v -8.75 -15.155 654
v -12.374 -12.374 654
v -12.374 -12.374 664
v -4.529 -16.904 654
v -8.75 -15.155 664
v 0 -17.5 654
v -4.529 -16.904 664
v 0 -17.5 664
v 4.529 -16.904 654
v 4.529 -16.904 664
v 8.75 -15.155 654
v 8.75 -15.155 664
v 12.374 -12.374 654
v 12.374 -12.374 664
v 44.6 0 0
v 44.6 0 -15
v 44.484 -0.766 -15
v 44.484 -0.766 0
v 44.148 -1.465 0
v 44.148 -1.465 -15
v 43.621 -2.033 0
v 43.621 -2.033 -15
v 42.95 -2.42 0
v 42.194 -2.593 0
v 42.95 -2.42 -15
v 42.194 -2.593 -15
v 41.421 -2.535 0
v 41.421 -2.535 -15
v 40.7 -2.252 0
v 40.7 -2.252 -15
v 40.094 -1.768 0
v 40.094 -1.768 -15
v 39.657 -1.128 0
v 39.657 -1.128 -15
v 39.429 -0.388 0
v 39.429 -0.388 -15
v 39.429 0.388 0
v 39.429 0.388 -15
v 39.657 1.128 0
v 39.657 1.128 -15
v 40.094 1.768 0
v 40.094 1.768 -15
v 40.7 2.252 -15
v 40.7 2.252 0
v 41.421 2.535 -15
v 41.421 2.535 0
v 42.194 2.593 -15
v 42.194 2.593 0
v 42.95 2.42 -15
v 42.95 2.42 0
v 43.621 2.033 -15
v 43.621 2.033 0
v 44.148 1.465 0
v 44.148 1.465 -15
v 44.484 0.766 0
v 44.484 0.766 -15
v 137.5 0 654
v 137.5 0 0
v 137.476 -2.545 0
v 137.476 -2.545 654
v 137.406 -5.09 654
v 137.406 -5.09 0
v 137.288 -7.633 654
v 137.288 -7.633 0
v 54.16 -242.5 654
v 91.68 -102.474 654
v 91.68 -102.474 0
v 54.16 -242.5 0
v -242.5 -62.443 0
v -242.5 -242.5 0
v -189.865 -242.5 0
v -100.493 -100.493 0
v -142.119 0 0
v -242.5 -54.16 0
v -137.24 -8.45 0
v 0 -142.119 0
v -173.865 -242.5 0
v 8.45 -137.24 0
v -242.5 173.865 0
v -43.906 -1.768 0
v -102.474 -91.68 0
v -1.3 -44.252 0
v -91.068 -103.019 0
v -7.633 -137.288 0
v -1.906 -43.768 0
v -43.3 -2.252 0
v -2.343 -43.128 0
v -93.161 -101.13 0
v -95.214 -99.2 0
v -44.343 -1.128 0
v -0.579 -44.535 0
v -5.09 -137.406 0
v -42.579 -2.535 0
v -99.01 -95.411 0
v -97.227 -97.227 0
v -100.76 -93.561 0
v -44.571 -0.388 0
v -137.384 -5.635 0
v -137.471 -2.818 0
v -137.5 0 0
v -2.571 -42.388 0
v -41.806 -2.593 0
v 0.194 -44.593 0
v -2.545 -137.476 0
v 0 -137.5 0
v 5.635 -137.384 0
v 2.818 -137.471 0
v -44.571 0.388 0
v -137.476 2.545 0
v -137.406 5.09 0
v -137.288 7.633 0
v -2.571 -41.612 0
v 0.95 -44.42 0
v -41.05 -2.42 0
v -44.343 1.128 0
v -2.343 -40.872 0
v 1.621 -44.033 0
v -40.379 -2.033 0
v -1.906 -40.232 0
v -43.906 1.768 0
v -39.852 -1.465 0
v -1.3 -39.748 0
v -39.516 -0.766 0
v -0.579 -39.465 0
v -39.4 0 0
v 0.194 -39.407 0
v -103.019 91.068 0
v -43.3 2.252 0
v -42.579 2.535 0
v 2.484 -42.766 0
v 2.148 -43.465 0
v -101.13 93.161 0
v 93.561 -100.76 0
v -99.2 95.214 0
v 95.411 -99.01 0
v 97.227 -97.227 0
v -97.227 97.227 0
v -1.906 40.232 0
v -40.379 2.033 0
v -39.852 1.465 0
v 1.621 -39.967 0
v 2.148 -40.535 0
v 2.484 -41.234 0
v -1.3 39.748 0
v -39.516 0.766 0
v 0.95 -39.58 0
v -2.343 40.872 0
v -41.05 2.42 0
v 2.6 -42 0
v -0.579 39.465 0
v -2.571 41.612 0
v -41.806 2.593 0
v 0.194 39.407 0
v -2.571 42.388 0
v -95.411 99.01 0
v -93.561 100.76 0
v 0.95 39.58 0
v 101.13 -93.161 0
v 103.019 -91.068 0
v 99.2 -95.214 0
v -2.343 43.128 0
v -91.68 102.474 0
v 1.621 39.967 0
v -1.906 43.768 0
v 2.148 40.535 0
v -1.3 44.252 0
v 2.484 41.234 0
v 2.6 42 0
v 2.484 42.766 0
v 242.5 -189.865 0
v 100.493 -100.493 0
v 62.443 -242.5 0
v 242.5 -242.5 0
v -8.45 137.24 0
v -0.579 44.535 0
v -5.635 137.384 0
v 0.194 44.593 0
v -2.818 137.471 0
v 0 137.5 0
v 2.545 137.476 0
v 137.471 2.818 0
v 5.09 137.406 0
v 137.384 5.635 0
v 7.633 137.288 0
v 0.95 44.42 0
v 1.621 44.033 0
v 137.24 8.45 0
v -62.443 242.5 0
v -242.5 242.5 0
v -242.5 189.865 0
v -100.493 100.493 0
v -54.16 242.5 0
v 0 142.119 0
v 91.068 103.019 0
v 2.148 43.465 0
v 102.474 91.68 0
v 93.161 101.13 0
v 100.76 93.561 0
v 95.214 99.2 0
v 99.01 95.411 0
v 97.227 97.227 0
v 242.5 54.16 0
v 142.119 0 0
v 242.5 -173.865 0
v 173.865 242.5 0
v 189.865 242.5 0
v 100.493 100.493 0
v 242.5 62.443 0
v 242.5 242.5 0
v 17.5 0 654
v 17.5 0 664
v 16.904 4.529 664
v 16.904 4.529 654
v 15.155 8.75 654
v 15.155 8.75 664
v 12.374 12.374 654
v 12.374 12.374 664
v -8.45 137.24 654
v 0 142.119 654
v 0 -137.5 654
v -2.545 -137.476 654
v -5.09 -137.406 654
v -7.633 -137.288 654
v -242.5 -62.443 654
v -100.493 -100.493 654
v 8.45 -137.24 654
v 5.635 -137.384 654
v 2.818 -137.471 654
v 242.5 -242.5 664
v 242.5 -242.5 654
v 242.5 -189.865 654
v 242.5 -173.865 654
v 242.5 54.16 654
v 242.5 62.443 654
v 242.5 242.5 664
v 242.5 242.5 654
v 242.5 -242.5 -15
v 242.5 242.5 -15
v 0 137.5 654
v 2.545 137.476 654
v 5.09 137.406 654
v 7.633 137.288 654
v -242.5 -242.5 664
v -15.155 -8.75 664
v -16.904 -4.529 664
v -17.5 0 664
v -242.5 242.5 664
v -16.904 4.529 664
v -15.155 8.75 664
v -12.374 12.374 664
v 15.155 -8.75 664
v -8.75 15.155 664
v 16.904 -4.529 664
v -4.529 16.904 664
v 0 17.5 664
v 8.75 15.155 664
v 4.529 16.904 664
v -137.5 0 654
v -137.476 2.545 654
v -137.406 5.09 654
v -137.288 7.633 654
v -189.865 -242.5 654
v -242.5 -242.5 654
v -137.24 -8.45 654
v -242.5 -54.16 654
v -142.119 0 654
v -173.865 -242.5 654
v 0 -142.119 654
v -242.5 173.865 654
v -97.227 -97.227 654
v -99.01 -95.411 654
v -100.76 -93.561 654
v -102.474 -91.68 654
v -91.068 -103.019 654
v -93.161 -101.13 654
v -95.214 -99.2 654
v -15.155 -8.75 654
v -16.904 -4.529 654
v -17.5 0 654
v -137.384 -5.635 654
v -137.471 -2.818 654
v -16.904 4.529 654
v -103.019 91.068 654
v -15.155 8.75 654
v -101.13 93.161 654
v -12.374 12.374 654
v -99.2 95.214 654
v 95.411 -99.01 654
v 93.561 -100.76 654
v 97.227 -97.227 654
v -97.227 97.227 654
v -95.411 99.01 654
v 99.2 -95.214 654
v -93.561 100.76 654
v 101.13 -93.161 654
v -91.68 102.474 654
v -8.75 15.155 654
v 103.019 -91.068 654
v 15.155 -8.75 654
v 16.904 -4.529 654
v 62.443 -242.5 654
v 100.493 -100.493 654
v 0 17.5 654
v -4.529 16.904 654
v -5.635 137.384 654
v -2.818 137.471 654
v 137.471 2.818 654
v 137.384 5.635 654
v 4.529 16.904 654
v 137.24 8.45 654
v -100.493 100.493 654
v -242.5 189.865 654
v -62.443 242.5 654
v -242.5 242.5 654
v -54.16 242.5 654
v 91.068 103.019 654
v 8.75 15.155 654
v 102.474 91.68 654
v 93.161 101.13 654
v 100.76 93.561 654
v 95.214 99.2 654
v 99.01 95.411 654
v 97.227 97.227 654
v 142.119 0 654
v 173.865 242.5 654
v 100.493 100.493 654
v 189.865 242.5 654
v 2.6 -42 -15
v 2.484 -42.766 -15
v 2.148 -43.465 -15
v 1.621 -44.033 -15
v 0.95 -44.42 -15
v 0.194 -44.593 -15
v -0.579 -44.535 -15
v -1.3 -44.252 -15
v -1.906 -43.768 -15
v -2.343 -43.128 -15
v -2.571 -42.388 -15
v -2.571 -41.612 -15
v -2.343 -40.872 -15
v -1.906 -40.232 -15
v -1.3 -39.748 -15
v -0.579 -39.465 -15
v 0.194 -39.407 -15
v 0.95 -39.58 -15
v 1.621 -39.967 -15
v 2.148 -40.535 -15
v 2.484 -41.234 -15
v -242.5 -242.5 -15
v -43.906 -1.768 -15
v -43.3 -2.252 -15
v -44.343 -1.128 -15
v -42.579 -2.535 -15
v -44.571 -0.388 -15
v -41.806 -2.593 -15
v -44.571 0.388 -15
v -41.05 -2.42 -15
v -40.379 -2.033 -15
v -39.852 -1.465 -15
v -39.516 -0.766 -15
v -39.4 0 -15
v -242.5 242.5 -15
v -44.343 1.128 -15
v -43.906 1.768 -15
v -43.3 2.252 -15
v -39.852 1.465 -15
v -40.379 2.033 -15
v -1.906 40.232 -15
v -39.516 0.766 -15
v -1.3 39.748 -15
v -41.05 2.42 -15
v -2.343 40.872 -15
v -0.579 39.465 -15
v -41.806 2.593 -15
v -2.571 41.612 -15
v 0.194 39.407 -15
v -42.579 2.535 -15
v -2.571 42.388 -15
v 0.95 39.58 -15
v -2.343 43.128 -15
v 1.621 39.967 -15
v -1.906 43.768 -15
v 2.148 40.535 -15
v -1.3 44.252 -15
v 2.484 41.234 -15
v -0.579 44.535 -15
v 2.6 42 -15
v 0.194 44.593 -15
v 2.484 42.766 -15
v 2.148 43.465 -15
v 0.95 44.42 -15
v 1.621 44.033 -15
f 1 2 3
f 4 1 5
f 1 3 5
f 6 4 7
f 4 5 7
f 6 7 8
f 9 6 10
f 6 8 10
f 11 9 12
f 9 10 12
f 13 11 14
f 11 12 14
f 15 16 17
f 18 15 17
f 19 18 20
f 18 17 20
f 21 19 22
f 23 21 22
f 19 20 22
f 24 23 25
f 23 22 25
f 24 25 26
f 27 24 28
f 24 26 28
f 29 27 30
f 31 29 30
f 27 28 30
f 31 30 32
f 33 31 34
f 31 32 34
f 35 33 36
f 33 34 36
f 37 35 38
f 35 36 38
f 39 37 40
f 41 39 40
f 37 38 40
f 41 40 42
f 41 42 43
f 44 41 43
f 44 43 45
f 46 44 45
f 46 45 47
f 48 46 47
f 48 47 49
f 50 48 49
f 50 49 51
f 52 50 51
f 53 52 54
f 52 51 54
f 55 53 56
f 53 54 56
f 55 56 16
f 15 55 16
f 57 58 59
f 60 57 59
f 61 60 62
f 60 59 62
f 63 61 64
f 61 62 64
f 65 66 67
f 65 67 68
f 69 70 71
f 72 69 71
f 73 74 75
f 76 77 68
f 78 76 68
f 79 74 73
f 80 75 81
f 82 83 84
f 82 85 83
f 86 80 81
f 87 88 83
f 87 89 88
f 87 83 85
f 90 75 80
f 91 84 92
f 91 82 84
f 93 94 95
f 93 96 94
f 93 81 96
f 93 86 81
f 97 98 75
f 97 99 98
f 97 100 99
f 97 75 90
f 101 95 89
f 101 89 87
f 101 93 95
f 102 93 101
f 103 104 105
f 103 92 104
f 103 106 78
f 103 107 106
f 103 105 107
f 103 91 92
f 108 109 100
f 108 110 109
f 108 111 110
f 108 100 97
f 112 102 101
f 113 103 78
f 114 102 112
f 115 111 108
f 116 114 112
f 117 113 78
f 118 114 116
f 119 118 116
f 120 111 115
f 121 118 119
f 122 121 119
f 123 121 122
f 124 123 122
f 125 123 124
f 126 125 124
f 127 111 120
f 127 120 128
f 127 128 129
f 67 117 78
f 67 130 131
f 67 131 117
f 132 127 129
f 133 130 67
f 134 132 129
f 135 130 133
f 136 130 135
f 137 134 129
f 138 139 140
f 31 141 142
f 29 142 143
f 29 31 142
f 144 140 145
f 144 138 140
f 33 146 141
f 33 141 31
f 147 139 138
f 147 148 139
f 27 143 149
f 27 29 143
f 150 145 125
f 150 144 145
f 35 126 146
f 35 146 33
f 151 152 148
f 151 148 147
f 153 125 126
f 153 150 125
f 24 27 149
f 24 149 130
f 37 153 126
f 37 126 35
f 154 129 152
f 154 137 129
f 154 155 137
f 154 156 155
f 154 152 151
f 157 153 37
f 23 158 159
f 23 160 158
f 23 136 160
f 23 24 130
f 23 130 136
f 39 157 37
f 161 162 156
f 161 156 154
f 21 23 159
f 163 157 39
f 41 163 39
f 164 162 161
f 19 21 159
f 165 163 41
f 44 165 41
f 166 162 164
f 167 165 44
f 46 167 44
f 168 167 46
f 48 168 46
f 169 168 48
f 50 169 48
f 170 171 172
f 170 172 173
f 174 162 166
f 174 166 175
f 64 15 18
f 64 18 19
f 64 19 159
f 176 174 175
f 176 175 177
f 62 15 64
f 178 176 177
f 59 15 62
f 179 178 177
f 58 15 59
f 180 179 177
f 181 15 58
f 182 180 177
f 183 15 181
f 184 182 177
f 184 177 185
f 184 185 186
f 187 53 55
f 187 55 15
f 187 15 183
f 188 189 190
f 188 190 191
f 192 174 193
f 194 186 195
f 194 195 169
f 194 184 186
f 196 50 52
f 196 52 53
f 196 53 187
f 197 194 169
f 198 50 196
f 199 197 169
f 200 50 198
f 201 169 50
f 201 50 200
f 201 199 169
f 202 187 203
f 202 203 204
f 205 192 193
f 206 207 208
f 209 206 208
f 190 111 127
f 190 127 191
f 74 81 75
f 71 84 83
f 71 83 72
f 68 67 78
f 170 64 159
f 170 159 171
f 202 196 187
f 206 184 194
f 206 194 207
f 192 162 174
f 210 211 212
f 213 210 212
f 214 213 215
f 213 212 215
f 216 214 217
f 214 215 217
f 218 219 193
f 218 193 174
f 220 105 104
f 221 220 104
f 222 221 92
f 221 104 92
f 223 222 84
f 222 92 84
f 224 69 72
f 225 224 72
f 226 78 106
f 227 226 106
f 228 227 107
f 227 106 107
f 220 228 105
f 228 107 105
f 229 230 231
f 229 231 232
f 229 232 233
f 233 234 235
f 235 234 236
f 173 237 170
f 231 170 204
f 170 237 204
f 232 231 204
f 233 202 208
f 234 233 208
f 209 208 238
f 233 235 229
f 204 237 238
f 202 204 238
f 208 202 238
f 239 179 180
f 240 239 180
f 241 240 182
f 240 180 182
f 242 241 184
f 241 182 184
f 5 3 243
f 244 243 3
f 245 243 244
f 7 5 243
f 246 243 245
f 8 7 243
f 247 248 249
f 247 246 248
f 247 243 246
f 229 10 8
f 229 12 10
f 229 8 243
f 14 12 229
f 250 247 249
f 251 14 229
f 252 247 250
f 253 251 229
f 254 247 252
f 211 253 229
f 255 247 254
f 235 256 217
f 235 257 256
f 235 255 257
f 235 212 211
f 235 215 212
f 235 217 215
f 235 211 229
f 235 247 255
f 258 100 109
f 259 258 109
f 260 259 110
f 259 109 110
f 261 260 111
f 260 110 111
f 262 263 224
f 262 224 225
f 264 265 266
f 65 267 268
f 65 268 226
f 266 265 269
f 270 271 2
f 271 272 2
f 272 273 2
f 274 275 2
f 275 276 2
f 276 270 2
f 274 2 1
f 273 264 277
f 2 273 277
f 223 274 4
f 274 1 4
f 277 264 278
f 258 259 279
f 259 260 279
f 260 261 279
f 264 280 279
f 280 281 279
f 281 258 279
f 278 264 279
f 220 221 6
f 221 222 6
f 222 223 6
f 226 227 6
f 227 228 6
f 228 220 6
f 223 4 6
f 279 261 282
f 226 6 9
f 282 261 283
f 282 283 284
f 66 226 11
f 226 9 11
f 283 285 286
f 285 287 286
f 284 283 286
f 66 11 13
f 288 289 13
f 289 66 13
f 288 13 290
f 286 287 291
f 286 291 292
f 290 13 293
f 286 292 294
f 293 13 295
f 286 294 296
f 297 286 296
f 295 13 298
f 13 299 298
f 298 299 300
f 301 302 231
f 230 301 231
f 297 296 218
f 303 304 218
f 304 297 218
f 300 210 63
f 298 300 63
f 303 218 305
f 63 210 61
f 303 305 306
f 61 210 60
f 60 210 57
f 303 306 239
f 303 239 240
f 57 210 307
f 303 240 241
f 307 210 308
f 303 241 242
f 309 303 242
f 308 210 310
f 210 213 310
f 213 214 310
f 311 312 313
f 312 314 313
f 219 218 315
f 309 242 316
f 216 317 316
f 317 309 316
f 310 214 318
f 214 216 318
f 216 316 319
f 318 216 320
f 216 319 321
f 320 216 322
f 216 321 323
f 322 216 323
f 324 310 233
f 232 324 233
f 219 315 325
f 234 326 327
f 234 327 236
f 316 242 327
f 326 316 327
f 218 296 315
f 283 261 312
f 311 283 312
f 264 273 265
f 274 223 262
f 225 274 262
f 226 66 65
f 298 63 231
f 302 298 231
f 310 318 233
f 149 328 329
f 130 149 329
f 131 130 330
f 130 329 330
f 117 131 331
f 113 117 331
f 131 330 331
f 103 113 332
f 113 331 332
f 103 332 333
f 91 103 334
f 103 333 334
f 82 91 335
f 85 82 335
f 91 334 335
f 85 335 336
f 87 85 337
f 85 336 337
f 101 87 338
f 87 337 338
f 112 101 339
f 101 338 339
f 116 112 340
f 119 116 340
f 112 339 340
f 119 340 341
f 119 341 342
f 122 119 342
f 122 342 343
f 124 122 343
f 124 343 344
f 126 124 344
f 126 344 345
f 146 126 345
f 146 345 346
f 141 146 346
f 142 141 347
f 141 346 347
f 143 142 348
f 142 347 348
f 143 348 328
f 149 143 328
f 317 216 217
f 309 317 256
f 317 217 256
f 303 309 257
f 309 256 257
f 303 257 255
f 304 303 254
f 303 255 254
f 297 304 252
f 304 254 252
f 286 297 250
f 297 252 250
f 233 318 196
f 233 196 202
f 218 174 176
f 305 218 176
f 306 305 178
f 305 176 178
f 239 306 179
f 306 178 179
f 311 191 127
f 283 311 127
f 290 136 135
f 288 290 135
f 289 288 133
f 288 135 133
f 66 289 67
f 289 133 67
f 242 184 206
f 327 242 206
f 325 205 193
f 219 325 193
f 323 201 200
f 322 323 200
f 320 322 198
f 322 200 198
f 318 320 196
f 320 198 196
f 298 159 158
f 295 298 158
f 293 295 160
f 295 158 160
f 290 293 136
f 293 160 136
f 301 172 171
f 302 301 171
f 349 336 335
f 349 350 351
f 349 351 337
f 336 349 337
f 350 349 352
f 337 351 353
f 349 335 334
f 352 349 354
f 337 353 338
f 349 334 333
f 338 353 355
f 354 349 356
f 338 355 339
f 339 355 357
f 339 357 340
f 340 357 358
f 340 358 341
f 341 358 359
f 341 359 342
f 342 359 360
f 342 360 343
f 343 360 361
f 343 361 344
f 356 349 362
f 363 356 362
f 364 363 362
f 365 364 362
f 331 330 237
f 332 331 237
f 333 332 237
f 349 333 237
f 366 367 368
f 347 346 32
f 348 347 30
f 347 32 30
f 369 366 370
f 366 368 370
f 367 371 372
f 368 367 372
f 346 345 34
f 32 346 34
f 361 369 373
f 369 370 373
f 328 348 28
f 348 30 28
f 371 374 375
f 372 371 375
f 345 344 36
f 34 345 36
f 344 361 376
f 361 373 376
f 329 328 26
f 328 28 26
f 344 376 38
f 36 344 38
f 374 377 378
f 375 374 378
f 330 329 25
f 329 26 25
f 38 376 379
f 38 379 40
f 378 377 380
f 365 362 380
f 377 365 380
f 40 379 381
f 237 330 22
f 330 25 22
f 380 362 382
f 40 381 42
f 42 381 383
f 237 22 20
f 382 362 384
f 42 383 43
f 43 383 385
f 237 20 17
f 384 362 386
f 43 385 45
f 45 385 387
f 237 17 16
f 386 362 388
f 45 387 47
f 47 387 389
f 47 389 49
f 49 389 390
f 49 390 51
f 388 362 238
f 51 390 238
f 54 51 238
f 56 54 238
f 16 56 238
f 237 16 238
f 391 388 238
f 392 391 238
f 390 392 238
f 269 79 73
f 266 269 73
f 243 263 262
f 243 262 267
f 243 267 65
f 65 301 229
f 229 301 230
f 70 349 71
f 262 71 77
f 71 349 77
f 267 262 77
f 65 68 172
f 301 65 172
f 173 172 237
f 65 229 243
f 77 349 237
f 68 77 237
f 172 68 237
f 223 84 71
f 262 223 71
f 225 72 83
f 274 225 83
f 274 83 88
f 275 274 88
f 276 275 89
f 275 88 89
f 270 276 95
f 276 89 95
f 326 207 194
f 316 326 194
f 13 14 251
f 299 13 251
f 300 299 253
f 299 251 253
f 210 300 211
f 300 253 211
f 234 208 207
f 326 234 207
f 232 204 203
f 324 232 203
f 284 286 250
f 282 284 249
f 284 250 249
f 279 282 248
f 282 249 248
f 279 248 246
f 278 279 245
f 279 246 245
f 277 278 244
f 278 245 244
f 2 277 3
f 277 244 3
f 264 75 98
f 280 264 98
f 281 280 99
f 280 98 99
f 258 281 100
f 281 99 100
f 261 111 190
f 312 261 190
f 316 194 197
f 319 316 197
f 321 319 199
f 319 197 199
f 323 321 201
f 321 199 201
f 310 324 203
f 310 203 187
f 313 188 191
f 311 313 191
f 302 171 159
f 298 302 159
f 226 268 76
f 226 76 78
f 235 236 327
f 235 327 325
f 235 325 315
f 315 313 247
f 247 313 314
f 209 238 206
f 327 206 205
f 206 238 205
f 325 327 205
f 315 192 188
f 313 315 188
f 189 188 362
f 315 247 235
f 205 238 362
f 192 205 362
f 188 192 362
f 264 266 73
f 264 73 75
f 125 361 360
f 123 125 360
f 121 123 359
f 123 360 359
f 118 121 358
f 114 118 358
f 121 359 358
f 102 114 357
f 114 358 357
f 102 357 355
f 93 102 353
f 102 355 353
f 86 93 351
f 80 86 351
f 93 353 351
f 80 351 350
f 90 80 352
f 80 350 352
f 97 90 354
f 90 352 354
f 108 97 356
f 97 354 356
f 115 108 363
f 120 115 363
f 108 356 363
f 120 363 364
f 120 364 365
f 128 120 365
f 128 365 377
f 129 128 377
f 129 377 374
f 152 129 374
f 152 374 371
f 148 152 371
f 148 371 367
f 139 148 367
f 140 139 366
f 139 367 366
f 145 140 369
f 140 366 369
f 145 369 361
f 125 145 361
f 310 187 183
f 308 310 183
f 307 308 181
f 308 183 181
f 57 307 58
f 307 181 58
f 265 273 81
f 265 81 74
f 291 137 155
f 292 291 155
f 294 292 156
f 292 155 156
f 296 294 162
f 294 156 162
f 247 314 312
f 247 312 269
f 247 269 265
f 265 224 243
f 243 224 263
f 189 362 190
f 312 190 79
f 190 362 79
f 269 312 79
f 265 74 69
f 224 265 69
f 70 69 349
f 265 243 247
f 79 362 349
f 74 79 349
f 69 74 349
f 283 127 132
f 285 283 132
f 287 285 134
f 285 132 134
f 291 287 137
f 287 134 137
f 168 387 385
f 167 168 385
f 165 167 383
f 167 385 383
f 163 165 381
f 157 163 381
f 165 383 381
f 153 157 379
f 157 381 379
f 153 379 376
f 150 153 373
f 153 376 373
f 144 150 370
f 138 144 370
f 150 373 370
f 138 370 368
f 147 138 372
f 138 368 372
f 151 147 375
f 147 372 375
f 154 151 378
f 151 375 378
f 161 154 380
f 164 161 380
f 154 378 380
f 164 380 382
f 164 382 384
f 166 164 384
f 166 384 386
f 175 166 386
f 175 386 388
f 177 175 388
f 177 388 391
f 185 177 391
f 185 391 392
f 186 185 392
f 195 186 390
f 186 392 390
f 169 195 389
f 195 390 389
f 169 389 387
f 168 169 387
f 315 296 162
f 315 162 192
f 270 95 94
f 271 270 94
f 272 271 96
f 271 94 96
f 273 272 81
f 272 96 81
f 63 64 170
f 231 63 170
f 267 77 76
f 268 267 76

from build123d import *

# Parameters (mm, degrees)
F1_DEPTH = 15
F2_DEPTH = 654
F4_DEPTH = 10
F6_DEPTH = 10
F7_R     = 2.6
F8_DEPTH = 15


with BuildPart() as f1:
    # F0 (on Top) → F1 (new body)
    with BuildSketch(Plane.XY):
        Polygon((-242.5, 242.5), (-100.4931687369, 100.4931687369), (-62.4425529802, 242.5), align=None)
        with BuildLine():
            Line((-242.5, 189.8653347947), (-137.2879845203, 7.6327784171))
            ThreePointArc((-137.2879845203, 7.6327784171), (-127.1895403437, 52.2405094458), (-103.0185713345, 91.0682379329))
            Line((-103.0185713345, 91.0682379329), (-100.4931687369, 100.4931687369))
            Line((-100.4931687369, 100.4931687369), (-242.5, 242.5))
            Line((-242.5, 242.5), (-242.5, 189.8653347947))
        make_face()
        with BuildLine():
            ThreePointArc((95.4594154602, 95.4594154602), (124.723736889, 51.6622633693), (135, 0))
            Line((135, 0), (137.5, 0))
            ThreePointArc((137.5, 0), (137.4350093838, 4.2270788599), (137.2400989718, 8.4501617857))
            ThreePointArc((137.2400989718, 8.4501617857), (126.8762049548, 52.9969679913), (102.4744542077, 91.6800754517))
            ThreePointArc((102.4744542077, 91.6800754517), (99.8893313431, 94.4900602382), (97.2271824132, 97.2271824132))
            Line((97.2271824132, 97.2271824132), (95.4594154602, 95.4594154602))
        make_face()
        with BuildLine():
            Line((0, -135), (0, 0))
            Line((0, 0), (-95.4594154602, -95.4594154602))
            ThreePointArc((-95.4594154602, -95.4594154602), (-51.6622633693, -124.723736889), (0, -135))
        make_face()
        with BuildLine():
            Line((54.1603435369, -242.5), (91.6800754517, -102.4744542077))
            ThreePointArc((91.6800754517, -102.4744542077), (52.9969679913, -126.8762049548), (8.4501617857, -137.2400989718))
            Line((8.4501617857, -137.2400989718), (0, -142.1188021535))
            Line((0, -142.1188021535), (0, -242.5))
            Line((0, -242.5), (54.1603435369, -242.5))
        make_face()
        Polygon((242.5, -242.5), (100.4931687369, -100.4931687369), (62.4425529802, -242.5), align=None)
        Polygon((0, -242.5), (0, -142.1188021535), (-173.8653347947, -242.5), align=None)
        with BuildLine():
            ThreePointArc((0, -135), (51.6622633693, -124.723736889), (95.4594154602, -95.4594154602))
            Line((95.4594154602, -95.4594154602), (0, 0))
            Line((0, 0), (0, -135))
        make_face()
        with BuildLine():
            ThreePointArc((95.4594154602, -95.4594154602), (124.723736889, -51.6622633693), (135, 0))
            Line((135, 0), (0, 0))
            Line((0, 0), (95.4594154602, -95.4594154602))
        make_face()
        with BuildLine():
            Line((97.2271824132, -97.2271824132), (95.4594154602, -95.4594154602))
            ThreePointArc((95.4594154602, -95.4594154602), (51.6622633693, -124.723736889), (0, -135))
            Line((0, -135), (0, -137.5))
            ThreePointArc((0, -137.5), (4.2270788599, -137.4350093838), (8.4501617857, -137.2400989718))
            ThreePointArc((8.4501617857, -137.2400989718), (52.9969679913, -126.8762049548), (91.6800754517, -102.4744542077))
            ThreePointArc((91.6800754517, -102.4744542077), (94.4900602382, -99.8893313431), (97.2271824132, -97.2271824132))
        make_face()
        with BuildLine():
            ThreePointArc((-95.4594154602, 95.4594154602), (-51.6622633693, 124.723736889), (0, 135))
            Line((0, 135), (0, 137.5))
            ThreePointArc((0, 137.5), (-4.2270788599, 137.4350093838), (-8.4501617857, 137.2400989718))
            ThreePointArc((-8.4501617857, 137.2400989718), (-52.9969679913, 126.8762049548), (-91.6800754517, 102.4744542077))
            ThreePointArc((-91.6800754517, 102.4744542077), (-94.4900602382, 99.8893313431), (-97.2271824132, 97.2271824132))
            Line((-97.2271824132, 97.2271824132), (-95.4594154602, 95.4594154602))
        make_face()
        with BuildLine():
            Line((242.5, -189.8653347947), (137.2879845203, -7.6327784171))
            ThreePointArc((137.2879845203, -7.6327784171), (127.1895403437, -52.2405094458), (103.0185713345, -91.0682379329))
            Line((103.0185713345, -91.0682379329), (100.4931687369, -100.4931687369))
            Line((100.4931687369, -100.4931687369), (242.5, -242.5))
            Line((242.5, -242.5), (242.5, -189.8653347947))
        make_face()
        with BuildLine():
            Line((137.5, 0), (135, 0))
            ThreePointArc((135, 0), (124.723736889, -51.6622633693), (95.4594154602, -95.4594154602))
            Line((95.4594154602, -95.4594154602), (97.2271824132, -97.2271824132))
            ThreePointArc((97.2271824132, -97.2271824132), (100.1702232341, -94.1922309813), (103.0185713345, -91.0682379329))
            ThreePointArc((103.0185713345, -91.0682379329), (127.1895403437, -52.2405094458), (137.2879845203, -7.6327784171))
            ThreePointArc((137.2879845203, -7.6327784171), (137.4469859101, -3.8178612117), (137.5, 0))
        make_face()
        with BuildLine():
            Line((-95.4594154602, -95.4594154602), (0, 0))
            Line((0, 0), (-135, 0))
            ThreePointArc((-135, 0), (-124.723736889, -51.6622633693), (-95.4594154602, -95.4594154602))
        make_face()
        with BuildLine():
            Line((-135, 0), (0, 0))
            Line((0, 0), (-95.4594154602, 95.4594154602))
            ThreePointArc((-95.4594154602, 95.4594154602), (-124.723736889, 51.6622633693), (-135, 0))
        make_face()
        with BuildLine():
            ThreePointArc((0, 135), (51.6622633693, 124.723736889), (95.4594154602, 95.4594154602))
            Line((95.4594154602, 95.4594154602), (97.2271824132, 97.2271824132))
            ThreePointArc((97.2271824132, 97.2271824132), (94.1922309813, 100.1702232341), (91.0682379329, 103.0185713345))
            ThreePointArc((91.0682379329, 103.0185713345), (52.2405094458, 127.1895403437), (7.6327784171, 137.2879845203))
            ThreePointArc((7.6327784171, 137.2879845203), (3.8178612117, 137.4469859101), (0, 137.5))
            Line((0, 137.5), (0, 135))
        make_face()
        with BuildLine():
            ThreePointArc((-102.4744542077, -91.6800754517), (-126.8762049548, -52.9969679913), (-137.2400989718, -8.4501617857))
            Line((-137.2400989718, -8.4501617857), (-142.1188021535, 0))
            Line((-142.1188021535, 0), (-242.5, 0))
            Line((-242.5, 0), (-242.5, -54.1603435369))
            Line((-242.5, -54.1603435369), (-102.4744542077, -91.6800754517))
        make_face()
        with BuildLine():
            Line((0, -137.5), (0, -135))
            ThreePointArc((0, -135), (-51.6622633693, -124.723736889), (-95.4594154602, -95.4594154602))
            Line((-95.4594154602, -95.4594154602), (-97.2271824132, -97.2271824132))
            ThreePointArc((-97.2271824132, -97.2271824132), (-94.1922309813, -100.1702232341), (-91.0682379329, -103.0185713345))
            ThreePointArc((-91.0682379329, -103.0185713345), (-52.2405094458, -127.1895403437), (-7.6327784171, -137.2879845203))
            ThreePointArc((-7.6327784171, -137.2879845203), (-3.8178612117, -137.4469859101), (0, -137.5))
        make_face()
        with BuildLine():
            Line((-95.4594154602, 95.4594154602), (0, 0))
            Line((0, 0), (0, 135))
            ThreePointArc((0, 135), (-51.6622633693, 124.723736889), (-95.4594154602, 95.4594154602))
        make_face()
        with BuildLine():
            Line((0, 0), (135, 0))
            ThreePointArc((135, 0), (124.723736889, 51.6622633693), (95.4594154602, 95.4594154602))
            Line((95.4594154602, 95.4594154602), (0, 0))
        make_face()
        with BuildLine():
            Line((0, 0), (95.4594154602, 95.4594154602))
            ThreePointArc((95.4594154602, 95.4594154602), (51.6622633693, 124.723736889), (0, 135))
            Line((0, 135), (0, 0))
        make_face()
        Polygon((-242.5, 0), (-142.1188021535, 0), (-242.5, 173.8653347947), align=None)
        Polygon((-242.5, -242.5), (-100.4931687369, -100.4931687369), (-242.5, -62.4425529802), align=None)
        Polygon((242.5, 0), (142.1188021535, 0), (242.5, -173.8653347947), align=None)
        with BuildLine():
            ThreePointArc((-95.4594154602, -95.4594154602), (-124.723736889, -51.6622633693), (-135, 0))
            Line((-135, 0), (-137.5, 0))
            ThreePointArc((-137.5, 0), (-137.4350093838, -4.2270788599), (-137.2400989718, -8.4501617857))
            ThreePointArc((-137.2400989718, -8.4501617857), (-126.8762049548, -52.9969679913), (-102.4744542077, -91.6800754517))
            ThreePointArc((-102.4744542077, -91.6800754517), (-99.8893313431, -94.4900602382), (-97.2271824132, -97.2271824132))
            Line((-97.2271824132, -97.2271824132), (-95.4594154602, -95.4594154602))
        make_face()
        with BuildLine():
            ThreePointArc((102.4744542077, 91.6800754517), (126.8762049548, 52.9969679913), (137.2400989718, 8.4501617857))
            Line((137.2400989718, 8.4501617857), (142.1188021535, 0))
            Line((142.1188021535, 0), (242.5, 0))
            Line((242.5, 0), (242.5, 54.1603435369))
            Line((242.5, 54.1603435369), (102.4744542077, 91.6800754517))
        make_face()
        with BuildLine():
            Line((-189.8653347947, -242.5), (-7.6327784171, -137.2879845203))
            ThreePointArc((-7.6327784171, -137.2879845203), (-52.2405094458, -127.1895403437), (-91.0682379329, -103.0185713345))
            Line((-91.0682379329, -103.0185713345), (-100.4931687369, -100.4931687369))
            Line((-100.4931687369, -100.4931687369), (-242.5, -242.5))
            Line((-242.5, -242.5), (-189.8653347947, -242.5))
        make_face()
        with BuildLine():
            Line((-137.5, 0), (-135, 0))
            ThreePointArc((-135, 0), (-124.723736889, 51.6622633693), (-95.4594154602, 95.4594154602))
            Line((-95.4594154602, 95.4594154602), (-97.2271824132, 97.2271824132))
            ThreePointArc((-97.2271824132, 97.2271824132), (-100.1702232341, 94.1922309813), (-103.0185713345, 91.0682379329))
            ThreePointArc((-103.0185713345, 91.0682379329), (-127.1895403437, 52.2405094458), (-137.2879845203, 7.6327784171))
            ThreePointArc((-137.2879845203, 7.6327784171), (-137.4469859101, 3.8178612117), (-137.5, 0))
        make_face()
        with BuildLine():
            ThreePointArc((-91.0682379329, -103.0185713345), (-94.1922309813, -100.1702232341), (-97.2271824132, -97.2271824132))
            Line((-97.2271824132, -97.2271824132), (-100.4931687369, -100.4931687369))
            Line((-100.4931687369, -100.4931687369), (-91.0682379329, -103.0185713345))
        make_face()
        with BuildLine():
            ThreePointArc((137.2400989718, 8.4501617857), (137.4350093838, 4.2270788599), (137.5, 0))
            Line((137.5, 0), (142.1188021535, 0))
            Line((142.1188021535, 0), (137.2400989718, 8.4501617857))
        make_face()
        Polygon((0, -142.1188021535), (0, -137.5), (-181.8653347947, -242.5), (-173.8653347947, -242.5), align=None)
        with BuildLine():
            Line((242.5, -181.8653347947), (137.5, 0))
            ThreePointArc((137.5, 0), (137.4469859101, -3.8178612117), (137.2879845203, -7.6327784171))
            Line((137.2879845203, -7.6327784171), (242.5, -189.8653347947))
            Line((242.5, -189.8653347947), (242.5, -181.8653347947))
        make_face()
        Polygon((100.4931687369, -100.4931687369), (97.2271824132, -97.2271824132), (58.3014482586, -242.5), (62.4425529802, -242.5), align=None)
        with BuildLine():
            Line((-58.3014482586, 242.5), (-97.2271824132, 97.2271824132))
            ThreePointArc((-97.2271824132, 97.2271824132), (-94.4900602382, 99.8893313431), (-91.6800754517, 102.4744542077))
            Line((-91.6800754517, 102.4744542077), (-54.1603435369, 242.5))
            Line((-54.1603435369, 242.5), (-58.3014482586, 242.5))
        make_face()
        with BuildLine():
            ThreePointArc((8.4501617857, -137.2400989718), (4.2270788599, -137.4350093838), (0, -137.5))
            Line((0, -137.5), (0, -142.1188021535))
            Line((0, -142.1188021535), (8.4501617857, -137.2400989718))
        make_face()
        with BuildLine():
            ThreePointArc((-8.4501617857, 137.2400989718), (-4.2270788599, 137.4350093838), (0, 137.5))
            Line((0, 137.5), (0, 142.1188021535))
            Line((0, 142.1188021535), (-8.4501617857, 137.2400989718))
        make_face()
        Polygon((-100.4931687369, -100.4931687369), (-97.2271824132, -97.2271824132), (-242.5, -58.3014482586), (-242.5, -62.4425529802), align=None)
        with BuildLine():
            Line((58.3014482586, -242.5), (97.2271824132, -97.2271824131))
            ThreePointArc((97.2271824132, -97.2271824132), (94.4900602382, -99.8893313431), (91.6800754517, -102.4744542077))
            Line((91.6800754517, -102.4744542077), (54.1603435369, -242.5))
            Line((54.1603435369, -242.5), (58.3014482586, -242.5))
        make_face()
        Polygon((-142.1188021535, 0), (-137.5, 0), (-242.5, 181.8653347947), (-242.5, 173.8653347947), align=None)
        Polygon((-100.4931687369, 100.4931687369), (-97.2271824132, 97.2271824132), (-58.3014482586, 242.5), (-62.4425529802, 242.5), align=None)
        Polygon((100.4931687369, 100.4931687369), (97.2271824132, 97.2271824132), (242.5, 58.3014482586), (242.5, 62.4425529802), align=None)
        with BuildLine():
            Line((-242.5, -58.3014482586), (-97.2271824132, -97.2271824132))
            ThreePointArc((-97.2271824132, -97.2271824132), (-99.8893313431, -94.4900602382), (-102.4744542077, -91.6800754517))
            Line((-102.4744542077, -91.6800754517), (-242.5, -54.1603435369))
            Line((-242.5, -54.1603435369), (-242.5, -58.3014482586))
        make_face()
        with BuildLine():
            Line((242.5, 58.3014482586), (97.2271824132, 97.2271824132))
            ThreePointArc((97.2271824132, 97.2271824132), (99.8893313431, 94.4900602382), (102.4744542077, 91.6800754517))
            Line((102.4744542077, 91.6800754517), (242.5, 54.1603435369))
            Line((242.5, 54.1603435369), (242.5, 58.3014482586))
        make_face()
        with BuildLine():
            Line((-242.5, 181.8653347947), (-137.5, 0))
            ThreePointArc((-137.5, 0), (-137.4469859101, 3.8178612117), (-137.2879845203, 7.6327784171))
            Line((-137.2879845203, 7.6327784171), (-242.5, 189.8653347947))
            Line((-242.5, 189.8653347947), (-242.5, 181.8653347947))
        make_face()
        with BuildLine():
            ThreePointArc((-103.0185713345, 91.0682379329), (-100.1702232341, 94.1922309813), (-97.2271824132, 97.2271824132))
            Line((-97.2271824132, 97.2271824132), (-100.4931687369, 100.4931687369))
            Line((-100.4931687369, 100.4931687369), (-103.0185713345, 91.0682379329))
        make_face()
        Polygon((142.1188021535, 0), (137.5, 0), (242.5, -181.8653347947), (242.5, -173.8653347947), align=None)
        with BuildLine():
            Line((-181.8653347947, -242.5), (0, -137.5))
            ThreePointArc((0, -137.5), (-3.8178612117, -137.4469859101), (-7.6327784171, -137.2879845203))
            Line((-7.6327784171, -137.2879845203), (-189.8653347947, -242.5))
            Line((-189.8653347947, -242.5), (-181.8653347947, -242.5))
        make_face()
        with BuildLine():
            ThreePointArc((91.0682379329, 103.0185713345), (94.1922309813, 100.1702232341), (97.2271824132, 97.2271824132))
            Line((97.2271824132, 97.2271824132), (100.4931687369, 100.4931687369))
            Line((100.4931687369, 100.4931687369), (91.0682379329, 103.0185713345))
        make_face()
        with BuildLine():
            ThreePointArc((103.0185713345, -91.0682379329), (100.1702232341, -94.1922309813), (97.2271824132, -97.2271824132))
            Line((97.2271824132, -97.2271824132), (100.4931687369, -100.4931687369))
            Line((100.4931687369, -100.4931687369), (103.0185713345, -91.0682379329))
        make_face()
        with BuildLine():
            ThreePointArc((-137.2400989718, -8.4501617857), (-137.4350093838, -4.2270788599), (-137.5, 0))
            Line((-137.5, 0), (-142.1188021535, 0))
            Line((-142.1188021535, 0), (-137.2400989718, -8.4501617857))
        make_face()
        with BuildLine():
            ThreePointArc((-91.6800754517, 102.4744542077), (-52.9969679913, 126.8762049548), (-8.4501617857, 137.2400989718))
            Line((-8.4501617857, 137.2400989718), (0, 142.1188021535))
            Line((0, 142.1188021535), (0, 242.5))
            Line((0, 242.5), (-54.1603435369, 242.5))
            Line((-54.1603435369, 242.5), (-91.6800754517, 102.4744542077))
        make_face()
        Polygon((242.5, 242.5), (100.4931687369, 100.4931687369), (242.5, 62.4425529802), align=None)
        Polygon((0, 242.5), (0, 142.1188021535), (173.8653347947, 242.5), align=None)
        with BuildLine():
            ThreePointArc((7.6327784171, 137.2879845203), (52.2405094458, 127.1895403437), (91.0682379329, 103.0185713345))
            Line((91.0682379329, 103.0185713345), (100.4931687369, 100.4931687369))
            Line((100.4931687369, 100.4931687369), (242.5, 242.5))
            Line((242.5, 242.5), (189.8653347947, 242.5))
            Line((189.8653347947, 242.5), (7.6327784171, 137.2879845203))
        make_face()
        Polygon((0, 142.1188021535), (0, 137.5), (181.8653347947, 242.5), (173.8653347947, 242.5), align=None)
        with BuildLine():
            Line((181.8653347947, 242.5), (0, 137.5))
            ThreePointArc((0, 137.5), (3.8178612117, 137.4469859101), (7.6327784171, 137.2879845203))
            Line((7.6327784171, 137.2879845203), (189.8653347947, 242.5))
            Line((189.8653347947, 242.5), (181.8653347947, 242.5))
        make_face()
    extrude(amount=-F1_DEPTH)

    # F0 (on Top) → F2 (join)
    with BuildSketch(Plane.XY):
        Polygon((-100.4931687369, 100.4931687369), (-97.2271824132, 97.2271824132), (-58.3014482586, 242.5), (-62.4425529802, 242.5), align=None)
        with BuildLine():
            Line((-58.3014482586, 242.5), (-97.2271824132, 97.2271824132))
            ThreePointArc((-97.2271824132, 97.2271824132), (-94.4900602382, 99.8893313431), (-91.6800754517, 102.4744542077))
            Line((-91.6800754517, 102.4744542077), (-54.1603435369, 242.5))
            Line((-54.1603435369, 242.5), (-58.3014482586, 242.5))
        make_face()
        with BuildLine():
            ThreePointArc((-103.0185713345, 91.0682379329), (-100.1702232341, 94.1922309813), (-97.2271824132, 97.2271824132))
            Line((-97.2271824132, 97.2271824132), (-100.4931687369, 100.4931687369))
            Line((-100.4931687369, 100.4931687369), (-103.0185713345, 91.0682379329))
        make_face()
        Polygon((0, 142.1188021535), (0, 137.5), (181.8653347947, 242.5), (173.8653347947, 242.5), align=None)
        with BuildLine():
            Line((181.8653347947, 242.5), (0, 137.5))
            ThreePointArc((0, 137.5), (3.8178612117, 137.4469859101), (7.6327784171, 137.2879845203))
            Line((7.6327784171, 137.2879845203), (189.8653347947, 242.5))
            Line((189.8653347947, 242.5), (181.8653347947, 242.5))
        make_face()
        with BuildLine():
            ThreePointArc((-8.4501617857, 137.2400989718), (-4.2270788599, 137.4350093838), (0, 137.5))
            Line((0, 137.5), (0, 142.1188021535))
            Line((0, 142.1188021535), (-8.4501617857, 137.2400989718))
        make_face()
        with BuildLine():
            Line((242.5, 58.3014482586), (97.2271824132, 97.2271824132))
            ThreePointArc((97.2271824132, 97.2271824132), (99.8893313431, 94.4900602382), (102.4744542077, 91.6800754517))
            Line((102.4744542077, 91.6800754517), (242.5, 54.1603435369))
            Line((242.5, 54.1603435369), (242.5, 58.3014482586))
        make_face()
        Polygon((100.4931687369, 100.4931687369), (97.2271824132, 97.2271824132), (242.5, 58.3014482586), (242.5, 62.4425529802), align=None)
        with BuildLine():
            ThreePointArc((91.0682379329, 103.0185713345), (94.1922309813, 100.1702232341), (97.2271824132, 97.2271824132))
            Line((97.2271824132, 97.2271824132), (100.4931687369, 100.4931687369))
            Line((100.4931687369, 100.4931687369), (91.0682379329, 103.0185713345))
        make_face()
        with BuildLine():
            ThreePointArc((137.2400989718, 8.4501617857), (137.4350093838, 4.2270788599), (137.5, 0))
            Line((137.5, 0), (142.1188021535, 0))
            Line((142.1188021535, 0), (137.2400989718, 8.4501617857))
        make_face()
        Polygon((142.1188021535, 0), (137.5, 0), (242.5, -181.8653347947), (242.5, -173.8653347947), align=None)
        with BuildLine():
            Line((242.5, -181.8653347947), (137.5, 0))
            ThreePointArc((137.5, 0), (137.4469859101, -3.8178612117), (137.2879845203, -7.6327784171))
            Line((137.2879845203, -7.6327784171), (242.5, -189.8653347947))
            Line((242.5, -189.8653347947), (242.5, -181.8653347947))
        make_face()
        with BuildLine():
            Line((58.3014482586, -242.5), (97.2271824132, -97.2271824131))
            ThreePointArc((97.2271824132, -97.2271824132), (94.4900602382, -99.8893313431), (91.6800754517, -102.4744542077))
            Line((91.6800754517, -102.4744542077), (54.1603435369, -242.5))
            Line((54.1603435369, -242.5), (58.3014482586, -242.5))
        make_face()
        Polygon((100.4931687369, -100.4931687369), (97.2271824132, -97.2271824132), (58.3014482586, -242.5), (62.4425529802, -242.5), align=None)
        with BuildLine():
            ThreePointArc((103.0185713345, -91.0682379329), (100.1702232341, -94.1922309813), (97.2271824132, -97.2271824132))
            Line((97.2271824132, -97.2271824132), (100.4931687369, -100.4931687369))
            Line((100.4931687369, -100.4931687369), (103.0185713345, -91.0682379329))
        make_face()
        with BuildLine():
            Line((-181.8653347947, -242.5), (0, -137.5))
            ThreePointArc((0, -137.5), (-3.8178612117, -137.4469859101), (-7.6327784171, -137.2879845203))
            Line((-7.6327784171, -137.2879845203), (-189.8653347947, -242.5))
            Line((-189.8653347947, -242.5), (-181.8653347947, -242.5))
        make_face()
        Polygon((0, -142.1188021535), (0, -137.5), (-181.8653347947, -242.5), (-173.8653347947, -242.5), align=None)
        with BuildLine():
            ThreePointArc((8.4501617857, -137.2400989718), (4.2270788599, -137.4350093838), (0, -137.5))
            Line((0, -137.5), (0, -142.1188021535))
            Line((0, -142.1188021535), (8.4501617857, -137.2400989718))
        make_face()
        with BuildLine():
            ThreePointArc((-91.0682379329, -103.0185713345), (-94.1922309813, -100.1702232341), (-97.2271824132, -97.2271824132))
            Line((-97.2271824132, -97.2271824132), (-100.4931687369, -100.4931687369))
            Line((-100.4931687369, -100.4931687369), (-91.0682379329, -103.0185713345))
        make_face()
        Polygon((-100.4931687369, -100.4931687369), (-97.2271824132, -97.2271824132), (-242.5, -58.3014482586), (-242.5, -62.4425529802), align=None)
        with BuildLine():
            Line((-242.5, -58.3014482586), (-97.2271824132, -97.2271824132))
            ThreePointArc((-97.2271824132, -97.2271824132), (-99.8893313431, -94.4900602382), (-102.4744542077, -91.6800754517))
            Line((-102.4744542077, -91.6800754517), (-242.5, -54.1603435369))
            Line((-242.5, -54.1603435369), (-242.5, -58.3014482586))
        make_face()
        with BuildLine():
            Line((-242.5, 181.8653347947), (-137.5, 0))
            ThreePointArc((-137.5, 0), (-137.4469859101, 3.8178612117), (-137.2879845203, 7.6327784171))
            Line((-137.2879845203, 7.6327784171), (-242.5, 189.8653347947))
            Line((-242.5, 189.8653347947), (-242.5, 181.8653347947))
        make_face()
        Polygon((-142.1188021535, 0), (-137.5, 0), (-242.5, 181.8653347947), (-242.5, 173.8653347947), align=None)
        with BuildLine():
            ThreePointArc((-137.2400989718, -8.4501617857), (-137.4350093838, -4.2270788599), (-137.5, 0))
            Line((-137.5, 0), (-142.1188021535, 0))
            Line((-142.1188021535, 0), (-137.2400989718, -8.4501617857))
        make_face()
    extrude(amount=F2_DEPTH)

    # F3 (on face) → F4 (join)
    with BuildSketch(Plane.XY.offset(654)):
        with BuildLine():
            Line((102.4744542077, 91.6800754517), (242.5, 54.1603435369))
            Line((242.5, 54.1603435369), (242.5, 62.4425529802))
            Line((242.5, 62.4425529802), (91.0682379329, 103.0185713345))
            ThreePointArc((91.0682379329, 103.0185713345), (96.9372673046, 97.5162356099), (102.4744542077, 91.6800754517))
        make_face()
        with BuildLine():
            Line((-242.5, -242.5), (242.5, -242.5))
            Line((242.5, -242.5), (242.5, 54.1603435369))
            Line((242.5, 54.1603435369), (102.4744542077, 91.6800754517))
            ThreePointArc((102.4744542077, 91.6800754517), (96.9372673046, 97.5162356099), (91.0682379329, 103.0185713345))
            Line((91.0682379329, 103.0185713345), (242.5, 62.4425529802))
            Line((242.5, 62.4425529802), (242.5, 242.5))
            Line((242.5, 242.5), (-242.5, 242.5))
            Line((-242.5, 242.5), (-242.5, -242.5))
        make_face()
    extrude(amount=F4_DEPTH)

    # F5 (on face) → F6 (cut, through all)
    with BuildSketch(Plane.XY.offset(664)):
        with BuildLine():
            Line((0, 0), (-12.3743686708, 12.3743686708))
            ThreePointArc((-12.3743686708, 12.3743686708), (-17.5, 0), (-12.3743686708, -12.3743686708))
            Line((-12.3743686708, -12.3743686708), (0, 0))
        make_face()
        with BuildLine():
            Line((0, 0), (12.3743686708, 12.3743686708))
            ThreePointArc((12.3743686708, 12.3743686708), (0, 17.5), (-12.3743686708, 12.3743686708))
            Line((-12.3743686708, 12.3743686708), (0, 0))
        make_face()
        with BuildLine():
            ThreePointArc((12.3743686708, -12.3743686708), (16.1678918189, -6.6969600664), (17.5, 0))
            ThreePointArc((17.5, 0), (16.1678918189, 6.6969600664), (12.3743686708, 12.3743686708))
            Line((12.3743686708, 12.3743686708), (0, 0))
            Line((0, 0), (12.3743686708, -12.3743686708))
        make_face()
        with BuildLine():
            ThreePointArc((-12.3743686708, -12.3743686708), (0, -17.5), (12.3743686708, -12.3743686708))
            Line((12.3743686708, -12.3743686708), (0, 0))
            Line((0, 0), (-12.3743686708, -12.3743686708))
        make_face()
    extrude(amount=-F6_DEPTH, mode=Mode.SUBTRACT)

    # F7 (on face) → F8 (cut, through all)
    with BuildSketch(Plane(origin=(0, 0, -15), x_dir=(1, 0, 0), z_dir=(0, 0, -1))):
        with Locations((-42, 0)):
            Circle(F7_R)
        with Locations((0, 42)):
            Circle(F7_R)
        with Locations((42, 0)):
            Circle(F7_R)
        with Locations((0, -42)):
            Circle(F7_R)
    extrude(amount=-F8_DEPTH, mode=Mode.SUBTRACT)


solid = f1.part
